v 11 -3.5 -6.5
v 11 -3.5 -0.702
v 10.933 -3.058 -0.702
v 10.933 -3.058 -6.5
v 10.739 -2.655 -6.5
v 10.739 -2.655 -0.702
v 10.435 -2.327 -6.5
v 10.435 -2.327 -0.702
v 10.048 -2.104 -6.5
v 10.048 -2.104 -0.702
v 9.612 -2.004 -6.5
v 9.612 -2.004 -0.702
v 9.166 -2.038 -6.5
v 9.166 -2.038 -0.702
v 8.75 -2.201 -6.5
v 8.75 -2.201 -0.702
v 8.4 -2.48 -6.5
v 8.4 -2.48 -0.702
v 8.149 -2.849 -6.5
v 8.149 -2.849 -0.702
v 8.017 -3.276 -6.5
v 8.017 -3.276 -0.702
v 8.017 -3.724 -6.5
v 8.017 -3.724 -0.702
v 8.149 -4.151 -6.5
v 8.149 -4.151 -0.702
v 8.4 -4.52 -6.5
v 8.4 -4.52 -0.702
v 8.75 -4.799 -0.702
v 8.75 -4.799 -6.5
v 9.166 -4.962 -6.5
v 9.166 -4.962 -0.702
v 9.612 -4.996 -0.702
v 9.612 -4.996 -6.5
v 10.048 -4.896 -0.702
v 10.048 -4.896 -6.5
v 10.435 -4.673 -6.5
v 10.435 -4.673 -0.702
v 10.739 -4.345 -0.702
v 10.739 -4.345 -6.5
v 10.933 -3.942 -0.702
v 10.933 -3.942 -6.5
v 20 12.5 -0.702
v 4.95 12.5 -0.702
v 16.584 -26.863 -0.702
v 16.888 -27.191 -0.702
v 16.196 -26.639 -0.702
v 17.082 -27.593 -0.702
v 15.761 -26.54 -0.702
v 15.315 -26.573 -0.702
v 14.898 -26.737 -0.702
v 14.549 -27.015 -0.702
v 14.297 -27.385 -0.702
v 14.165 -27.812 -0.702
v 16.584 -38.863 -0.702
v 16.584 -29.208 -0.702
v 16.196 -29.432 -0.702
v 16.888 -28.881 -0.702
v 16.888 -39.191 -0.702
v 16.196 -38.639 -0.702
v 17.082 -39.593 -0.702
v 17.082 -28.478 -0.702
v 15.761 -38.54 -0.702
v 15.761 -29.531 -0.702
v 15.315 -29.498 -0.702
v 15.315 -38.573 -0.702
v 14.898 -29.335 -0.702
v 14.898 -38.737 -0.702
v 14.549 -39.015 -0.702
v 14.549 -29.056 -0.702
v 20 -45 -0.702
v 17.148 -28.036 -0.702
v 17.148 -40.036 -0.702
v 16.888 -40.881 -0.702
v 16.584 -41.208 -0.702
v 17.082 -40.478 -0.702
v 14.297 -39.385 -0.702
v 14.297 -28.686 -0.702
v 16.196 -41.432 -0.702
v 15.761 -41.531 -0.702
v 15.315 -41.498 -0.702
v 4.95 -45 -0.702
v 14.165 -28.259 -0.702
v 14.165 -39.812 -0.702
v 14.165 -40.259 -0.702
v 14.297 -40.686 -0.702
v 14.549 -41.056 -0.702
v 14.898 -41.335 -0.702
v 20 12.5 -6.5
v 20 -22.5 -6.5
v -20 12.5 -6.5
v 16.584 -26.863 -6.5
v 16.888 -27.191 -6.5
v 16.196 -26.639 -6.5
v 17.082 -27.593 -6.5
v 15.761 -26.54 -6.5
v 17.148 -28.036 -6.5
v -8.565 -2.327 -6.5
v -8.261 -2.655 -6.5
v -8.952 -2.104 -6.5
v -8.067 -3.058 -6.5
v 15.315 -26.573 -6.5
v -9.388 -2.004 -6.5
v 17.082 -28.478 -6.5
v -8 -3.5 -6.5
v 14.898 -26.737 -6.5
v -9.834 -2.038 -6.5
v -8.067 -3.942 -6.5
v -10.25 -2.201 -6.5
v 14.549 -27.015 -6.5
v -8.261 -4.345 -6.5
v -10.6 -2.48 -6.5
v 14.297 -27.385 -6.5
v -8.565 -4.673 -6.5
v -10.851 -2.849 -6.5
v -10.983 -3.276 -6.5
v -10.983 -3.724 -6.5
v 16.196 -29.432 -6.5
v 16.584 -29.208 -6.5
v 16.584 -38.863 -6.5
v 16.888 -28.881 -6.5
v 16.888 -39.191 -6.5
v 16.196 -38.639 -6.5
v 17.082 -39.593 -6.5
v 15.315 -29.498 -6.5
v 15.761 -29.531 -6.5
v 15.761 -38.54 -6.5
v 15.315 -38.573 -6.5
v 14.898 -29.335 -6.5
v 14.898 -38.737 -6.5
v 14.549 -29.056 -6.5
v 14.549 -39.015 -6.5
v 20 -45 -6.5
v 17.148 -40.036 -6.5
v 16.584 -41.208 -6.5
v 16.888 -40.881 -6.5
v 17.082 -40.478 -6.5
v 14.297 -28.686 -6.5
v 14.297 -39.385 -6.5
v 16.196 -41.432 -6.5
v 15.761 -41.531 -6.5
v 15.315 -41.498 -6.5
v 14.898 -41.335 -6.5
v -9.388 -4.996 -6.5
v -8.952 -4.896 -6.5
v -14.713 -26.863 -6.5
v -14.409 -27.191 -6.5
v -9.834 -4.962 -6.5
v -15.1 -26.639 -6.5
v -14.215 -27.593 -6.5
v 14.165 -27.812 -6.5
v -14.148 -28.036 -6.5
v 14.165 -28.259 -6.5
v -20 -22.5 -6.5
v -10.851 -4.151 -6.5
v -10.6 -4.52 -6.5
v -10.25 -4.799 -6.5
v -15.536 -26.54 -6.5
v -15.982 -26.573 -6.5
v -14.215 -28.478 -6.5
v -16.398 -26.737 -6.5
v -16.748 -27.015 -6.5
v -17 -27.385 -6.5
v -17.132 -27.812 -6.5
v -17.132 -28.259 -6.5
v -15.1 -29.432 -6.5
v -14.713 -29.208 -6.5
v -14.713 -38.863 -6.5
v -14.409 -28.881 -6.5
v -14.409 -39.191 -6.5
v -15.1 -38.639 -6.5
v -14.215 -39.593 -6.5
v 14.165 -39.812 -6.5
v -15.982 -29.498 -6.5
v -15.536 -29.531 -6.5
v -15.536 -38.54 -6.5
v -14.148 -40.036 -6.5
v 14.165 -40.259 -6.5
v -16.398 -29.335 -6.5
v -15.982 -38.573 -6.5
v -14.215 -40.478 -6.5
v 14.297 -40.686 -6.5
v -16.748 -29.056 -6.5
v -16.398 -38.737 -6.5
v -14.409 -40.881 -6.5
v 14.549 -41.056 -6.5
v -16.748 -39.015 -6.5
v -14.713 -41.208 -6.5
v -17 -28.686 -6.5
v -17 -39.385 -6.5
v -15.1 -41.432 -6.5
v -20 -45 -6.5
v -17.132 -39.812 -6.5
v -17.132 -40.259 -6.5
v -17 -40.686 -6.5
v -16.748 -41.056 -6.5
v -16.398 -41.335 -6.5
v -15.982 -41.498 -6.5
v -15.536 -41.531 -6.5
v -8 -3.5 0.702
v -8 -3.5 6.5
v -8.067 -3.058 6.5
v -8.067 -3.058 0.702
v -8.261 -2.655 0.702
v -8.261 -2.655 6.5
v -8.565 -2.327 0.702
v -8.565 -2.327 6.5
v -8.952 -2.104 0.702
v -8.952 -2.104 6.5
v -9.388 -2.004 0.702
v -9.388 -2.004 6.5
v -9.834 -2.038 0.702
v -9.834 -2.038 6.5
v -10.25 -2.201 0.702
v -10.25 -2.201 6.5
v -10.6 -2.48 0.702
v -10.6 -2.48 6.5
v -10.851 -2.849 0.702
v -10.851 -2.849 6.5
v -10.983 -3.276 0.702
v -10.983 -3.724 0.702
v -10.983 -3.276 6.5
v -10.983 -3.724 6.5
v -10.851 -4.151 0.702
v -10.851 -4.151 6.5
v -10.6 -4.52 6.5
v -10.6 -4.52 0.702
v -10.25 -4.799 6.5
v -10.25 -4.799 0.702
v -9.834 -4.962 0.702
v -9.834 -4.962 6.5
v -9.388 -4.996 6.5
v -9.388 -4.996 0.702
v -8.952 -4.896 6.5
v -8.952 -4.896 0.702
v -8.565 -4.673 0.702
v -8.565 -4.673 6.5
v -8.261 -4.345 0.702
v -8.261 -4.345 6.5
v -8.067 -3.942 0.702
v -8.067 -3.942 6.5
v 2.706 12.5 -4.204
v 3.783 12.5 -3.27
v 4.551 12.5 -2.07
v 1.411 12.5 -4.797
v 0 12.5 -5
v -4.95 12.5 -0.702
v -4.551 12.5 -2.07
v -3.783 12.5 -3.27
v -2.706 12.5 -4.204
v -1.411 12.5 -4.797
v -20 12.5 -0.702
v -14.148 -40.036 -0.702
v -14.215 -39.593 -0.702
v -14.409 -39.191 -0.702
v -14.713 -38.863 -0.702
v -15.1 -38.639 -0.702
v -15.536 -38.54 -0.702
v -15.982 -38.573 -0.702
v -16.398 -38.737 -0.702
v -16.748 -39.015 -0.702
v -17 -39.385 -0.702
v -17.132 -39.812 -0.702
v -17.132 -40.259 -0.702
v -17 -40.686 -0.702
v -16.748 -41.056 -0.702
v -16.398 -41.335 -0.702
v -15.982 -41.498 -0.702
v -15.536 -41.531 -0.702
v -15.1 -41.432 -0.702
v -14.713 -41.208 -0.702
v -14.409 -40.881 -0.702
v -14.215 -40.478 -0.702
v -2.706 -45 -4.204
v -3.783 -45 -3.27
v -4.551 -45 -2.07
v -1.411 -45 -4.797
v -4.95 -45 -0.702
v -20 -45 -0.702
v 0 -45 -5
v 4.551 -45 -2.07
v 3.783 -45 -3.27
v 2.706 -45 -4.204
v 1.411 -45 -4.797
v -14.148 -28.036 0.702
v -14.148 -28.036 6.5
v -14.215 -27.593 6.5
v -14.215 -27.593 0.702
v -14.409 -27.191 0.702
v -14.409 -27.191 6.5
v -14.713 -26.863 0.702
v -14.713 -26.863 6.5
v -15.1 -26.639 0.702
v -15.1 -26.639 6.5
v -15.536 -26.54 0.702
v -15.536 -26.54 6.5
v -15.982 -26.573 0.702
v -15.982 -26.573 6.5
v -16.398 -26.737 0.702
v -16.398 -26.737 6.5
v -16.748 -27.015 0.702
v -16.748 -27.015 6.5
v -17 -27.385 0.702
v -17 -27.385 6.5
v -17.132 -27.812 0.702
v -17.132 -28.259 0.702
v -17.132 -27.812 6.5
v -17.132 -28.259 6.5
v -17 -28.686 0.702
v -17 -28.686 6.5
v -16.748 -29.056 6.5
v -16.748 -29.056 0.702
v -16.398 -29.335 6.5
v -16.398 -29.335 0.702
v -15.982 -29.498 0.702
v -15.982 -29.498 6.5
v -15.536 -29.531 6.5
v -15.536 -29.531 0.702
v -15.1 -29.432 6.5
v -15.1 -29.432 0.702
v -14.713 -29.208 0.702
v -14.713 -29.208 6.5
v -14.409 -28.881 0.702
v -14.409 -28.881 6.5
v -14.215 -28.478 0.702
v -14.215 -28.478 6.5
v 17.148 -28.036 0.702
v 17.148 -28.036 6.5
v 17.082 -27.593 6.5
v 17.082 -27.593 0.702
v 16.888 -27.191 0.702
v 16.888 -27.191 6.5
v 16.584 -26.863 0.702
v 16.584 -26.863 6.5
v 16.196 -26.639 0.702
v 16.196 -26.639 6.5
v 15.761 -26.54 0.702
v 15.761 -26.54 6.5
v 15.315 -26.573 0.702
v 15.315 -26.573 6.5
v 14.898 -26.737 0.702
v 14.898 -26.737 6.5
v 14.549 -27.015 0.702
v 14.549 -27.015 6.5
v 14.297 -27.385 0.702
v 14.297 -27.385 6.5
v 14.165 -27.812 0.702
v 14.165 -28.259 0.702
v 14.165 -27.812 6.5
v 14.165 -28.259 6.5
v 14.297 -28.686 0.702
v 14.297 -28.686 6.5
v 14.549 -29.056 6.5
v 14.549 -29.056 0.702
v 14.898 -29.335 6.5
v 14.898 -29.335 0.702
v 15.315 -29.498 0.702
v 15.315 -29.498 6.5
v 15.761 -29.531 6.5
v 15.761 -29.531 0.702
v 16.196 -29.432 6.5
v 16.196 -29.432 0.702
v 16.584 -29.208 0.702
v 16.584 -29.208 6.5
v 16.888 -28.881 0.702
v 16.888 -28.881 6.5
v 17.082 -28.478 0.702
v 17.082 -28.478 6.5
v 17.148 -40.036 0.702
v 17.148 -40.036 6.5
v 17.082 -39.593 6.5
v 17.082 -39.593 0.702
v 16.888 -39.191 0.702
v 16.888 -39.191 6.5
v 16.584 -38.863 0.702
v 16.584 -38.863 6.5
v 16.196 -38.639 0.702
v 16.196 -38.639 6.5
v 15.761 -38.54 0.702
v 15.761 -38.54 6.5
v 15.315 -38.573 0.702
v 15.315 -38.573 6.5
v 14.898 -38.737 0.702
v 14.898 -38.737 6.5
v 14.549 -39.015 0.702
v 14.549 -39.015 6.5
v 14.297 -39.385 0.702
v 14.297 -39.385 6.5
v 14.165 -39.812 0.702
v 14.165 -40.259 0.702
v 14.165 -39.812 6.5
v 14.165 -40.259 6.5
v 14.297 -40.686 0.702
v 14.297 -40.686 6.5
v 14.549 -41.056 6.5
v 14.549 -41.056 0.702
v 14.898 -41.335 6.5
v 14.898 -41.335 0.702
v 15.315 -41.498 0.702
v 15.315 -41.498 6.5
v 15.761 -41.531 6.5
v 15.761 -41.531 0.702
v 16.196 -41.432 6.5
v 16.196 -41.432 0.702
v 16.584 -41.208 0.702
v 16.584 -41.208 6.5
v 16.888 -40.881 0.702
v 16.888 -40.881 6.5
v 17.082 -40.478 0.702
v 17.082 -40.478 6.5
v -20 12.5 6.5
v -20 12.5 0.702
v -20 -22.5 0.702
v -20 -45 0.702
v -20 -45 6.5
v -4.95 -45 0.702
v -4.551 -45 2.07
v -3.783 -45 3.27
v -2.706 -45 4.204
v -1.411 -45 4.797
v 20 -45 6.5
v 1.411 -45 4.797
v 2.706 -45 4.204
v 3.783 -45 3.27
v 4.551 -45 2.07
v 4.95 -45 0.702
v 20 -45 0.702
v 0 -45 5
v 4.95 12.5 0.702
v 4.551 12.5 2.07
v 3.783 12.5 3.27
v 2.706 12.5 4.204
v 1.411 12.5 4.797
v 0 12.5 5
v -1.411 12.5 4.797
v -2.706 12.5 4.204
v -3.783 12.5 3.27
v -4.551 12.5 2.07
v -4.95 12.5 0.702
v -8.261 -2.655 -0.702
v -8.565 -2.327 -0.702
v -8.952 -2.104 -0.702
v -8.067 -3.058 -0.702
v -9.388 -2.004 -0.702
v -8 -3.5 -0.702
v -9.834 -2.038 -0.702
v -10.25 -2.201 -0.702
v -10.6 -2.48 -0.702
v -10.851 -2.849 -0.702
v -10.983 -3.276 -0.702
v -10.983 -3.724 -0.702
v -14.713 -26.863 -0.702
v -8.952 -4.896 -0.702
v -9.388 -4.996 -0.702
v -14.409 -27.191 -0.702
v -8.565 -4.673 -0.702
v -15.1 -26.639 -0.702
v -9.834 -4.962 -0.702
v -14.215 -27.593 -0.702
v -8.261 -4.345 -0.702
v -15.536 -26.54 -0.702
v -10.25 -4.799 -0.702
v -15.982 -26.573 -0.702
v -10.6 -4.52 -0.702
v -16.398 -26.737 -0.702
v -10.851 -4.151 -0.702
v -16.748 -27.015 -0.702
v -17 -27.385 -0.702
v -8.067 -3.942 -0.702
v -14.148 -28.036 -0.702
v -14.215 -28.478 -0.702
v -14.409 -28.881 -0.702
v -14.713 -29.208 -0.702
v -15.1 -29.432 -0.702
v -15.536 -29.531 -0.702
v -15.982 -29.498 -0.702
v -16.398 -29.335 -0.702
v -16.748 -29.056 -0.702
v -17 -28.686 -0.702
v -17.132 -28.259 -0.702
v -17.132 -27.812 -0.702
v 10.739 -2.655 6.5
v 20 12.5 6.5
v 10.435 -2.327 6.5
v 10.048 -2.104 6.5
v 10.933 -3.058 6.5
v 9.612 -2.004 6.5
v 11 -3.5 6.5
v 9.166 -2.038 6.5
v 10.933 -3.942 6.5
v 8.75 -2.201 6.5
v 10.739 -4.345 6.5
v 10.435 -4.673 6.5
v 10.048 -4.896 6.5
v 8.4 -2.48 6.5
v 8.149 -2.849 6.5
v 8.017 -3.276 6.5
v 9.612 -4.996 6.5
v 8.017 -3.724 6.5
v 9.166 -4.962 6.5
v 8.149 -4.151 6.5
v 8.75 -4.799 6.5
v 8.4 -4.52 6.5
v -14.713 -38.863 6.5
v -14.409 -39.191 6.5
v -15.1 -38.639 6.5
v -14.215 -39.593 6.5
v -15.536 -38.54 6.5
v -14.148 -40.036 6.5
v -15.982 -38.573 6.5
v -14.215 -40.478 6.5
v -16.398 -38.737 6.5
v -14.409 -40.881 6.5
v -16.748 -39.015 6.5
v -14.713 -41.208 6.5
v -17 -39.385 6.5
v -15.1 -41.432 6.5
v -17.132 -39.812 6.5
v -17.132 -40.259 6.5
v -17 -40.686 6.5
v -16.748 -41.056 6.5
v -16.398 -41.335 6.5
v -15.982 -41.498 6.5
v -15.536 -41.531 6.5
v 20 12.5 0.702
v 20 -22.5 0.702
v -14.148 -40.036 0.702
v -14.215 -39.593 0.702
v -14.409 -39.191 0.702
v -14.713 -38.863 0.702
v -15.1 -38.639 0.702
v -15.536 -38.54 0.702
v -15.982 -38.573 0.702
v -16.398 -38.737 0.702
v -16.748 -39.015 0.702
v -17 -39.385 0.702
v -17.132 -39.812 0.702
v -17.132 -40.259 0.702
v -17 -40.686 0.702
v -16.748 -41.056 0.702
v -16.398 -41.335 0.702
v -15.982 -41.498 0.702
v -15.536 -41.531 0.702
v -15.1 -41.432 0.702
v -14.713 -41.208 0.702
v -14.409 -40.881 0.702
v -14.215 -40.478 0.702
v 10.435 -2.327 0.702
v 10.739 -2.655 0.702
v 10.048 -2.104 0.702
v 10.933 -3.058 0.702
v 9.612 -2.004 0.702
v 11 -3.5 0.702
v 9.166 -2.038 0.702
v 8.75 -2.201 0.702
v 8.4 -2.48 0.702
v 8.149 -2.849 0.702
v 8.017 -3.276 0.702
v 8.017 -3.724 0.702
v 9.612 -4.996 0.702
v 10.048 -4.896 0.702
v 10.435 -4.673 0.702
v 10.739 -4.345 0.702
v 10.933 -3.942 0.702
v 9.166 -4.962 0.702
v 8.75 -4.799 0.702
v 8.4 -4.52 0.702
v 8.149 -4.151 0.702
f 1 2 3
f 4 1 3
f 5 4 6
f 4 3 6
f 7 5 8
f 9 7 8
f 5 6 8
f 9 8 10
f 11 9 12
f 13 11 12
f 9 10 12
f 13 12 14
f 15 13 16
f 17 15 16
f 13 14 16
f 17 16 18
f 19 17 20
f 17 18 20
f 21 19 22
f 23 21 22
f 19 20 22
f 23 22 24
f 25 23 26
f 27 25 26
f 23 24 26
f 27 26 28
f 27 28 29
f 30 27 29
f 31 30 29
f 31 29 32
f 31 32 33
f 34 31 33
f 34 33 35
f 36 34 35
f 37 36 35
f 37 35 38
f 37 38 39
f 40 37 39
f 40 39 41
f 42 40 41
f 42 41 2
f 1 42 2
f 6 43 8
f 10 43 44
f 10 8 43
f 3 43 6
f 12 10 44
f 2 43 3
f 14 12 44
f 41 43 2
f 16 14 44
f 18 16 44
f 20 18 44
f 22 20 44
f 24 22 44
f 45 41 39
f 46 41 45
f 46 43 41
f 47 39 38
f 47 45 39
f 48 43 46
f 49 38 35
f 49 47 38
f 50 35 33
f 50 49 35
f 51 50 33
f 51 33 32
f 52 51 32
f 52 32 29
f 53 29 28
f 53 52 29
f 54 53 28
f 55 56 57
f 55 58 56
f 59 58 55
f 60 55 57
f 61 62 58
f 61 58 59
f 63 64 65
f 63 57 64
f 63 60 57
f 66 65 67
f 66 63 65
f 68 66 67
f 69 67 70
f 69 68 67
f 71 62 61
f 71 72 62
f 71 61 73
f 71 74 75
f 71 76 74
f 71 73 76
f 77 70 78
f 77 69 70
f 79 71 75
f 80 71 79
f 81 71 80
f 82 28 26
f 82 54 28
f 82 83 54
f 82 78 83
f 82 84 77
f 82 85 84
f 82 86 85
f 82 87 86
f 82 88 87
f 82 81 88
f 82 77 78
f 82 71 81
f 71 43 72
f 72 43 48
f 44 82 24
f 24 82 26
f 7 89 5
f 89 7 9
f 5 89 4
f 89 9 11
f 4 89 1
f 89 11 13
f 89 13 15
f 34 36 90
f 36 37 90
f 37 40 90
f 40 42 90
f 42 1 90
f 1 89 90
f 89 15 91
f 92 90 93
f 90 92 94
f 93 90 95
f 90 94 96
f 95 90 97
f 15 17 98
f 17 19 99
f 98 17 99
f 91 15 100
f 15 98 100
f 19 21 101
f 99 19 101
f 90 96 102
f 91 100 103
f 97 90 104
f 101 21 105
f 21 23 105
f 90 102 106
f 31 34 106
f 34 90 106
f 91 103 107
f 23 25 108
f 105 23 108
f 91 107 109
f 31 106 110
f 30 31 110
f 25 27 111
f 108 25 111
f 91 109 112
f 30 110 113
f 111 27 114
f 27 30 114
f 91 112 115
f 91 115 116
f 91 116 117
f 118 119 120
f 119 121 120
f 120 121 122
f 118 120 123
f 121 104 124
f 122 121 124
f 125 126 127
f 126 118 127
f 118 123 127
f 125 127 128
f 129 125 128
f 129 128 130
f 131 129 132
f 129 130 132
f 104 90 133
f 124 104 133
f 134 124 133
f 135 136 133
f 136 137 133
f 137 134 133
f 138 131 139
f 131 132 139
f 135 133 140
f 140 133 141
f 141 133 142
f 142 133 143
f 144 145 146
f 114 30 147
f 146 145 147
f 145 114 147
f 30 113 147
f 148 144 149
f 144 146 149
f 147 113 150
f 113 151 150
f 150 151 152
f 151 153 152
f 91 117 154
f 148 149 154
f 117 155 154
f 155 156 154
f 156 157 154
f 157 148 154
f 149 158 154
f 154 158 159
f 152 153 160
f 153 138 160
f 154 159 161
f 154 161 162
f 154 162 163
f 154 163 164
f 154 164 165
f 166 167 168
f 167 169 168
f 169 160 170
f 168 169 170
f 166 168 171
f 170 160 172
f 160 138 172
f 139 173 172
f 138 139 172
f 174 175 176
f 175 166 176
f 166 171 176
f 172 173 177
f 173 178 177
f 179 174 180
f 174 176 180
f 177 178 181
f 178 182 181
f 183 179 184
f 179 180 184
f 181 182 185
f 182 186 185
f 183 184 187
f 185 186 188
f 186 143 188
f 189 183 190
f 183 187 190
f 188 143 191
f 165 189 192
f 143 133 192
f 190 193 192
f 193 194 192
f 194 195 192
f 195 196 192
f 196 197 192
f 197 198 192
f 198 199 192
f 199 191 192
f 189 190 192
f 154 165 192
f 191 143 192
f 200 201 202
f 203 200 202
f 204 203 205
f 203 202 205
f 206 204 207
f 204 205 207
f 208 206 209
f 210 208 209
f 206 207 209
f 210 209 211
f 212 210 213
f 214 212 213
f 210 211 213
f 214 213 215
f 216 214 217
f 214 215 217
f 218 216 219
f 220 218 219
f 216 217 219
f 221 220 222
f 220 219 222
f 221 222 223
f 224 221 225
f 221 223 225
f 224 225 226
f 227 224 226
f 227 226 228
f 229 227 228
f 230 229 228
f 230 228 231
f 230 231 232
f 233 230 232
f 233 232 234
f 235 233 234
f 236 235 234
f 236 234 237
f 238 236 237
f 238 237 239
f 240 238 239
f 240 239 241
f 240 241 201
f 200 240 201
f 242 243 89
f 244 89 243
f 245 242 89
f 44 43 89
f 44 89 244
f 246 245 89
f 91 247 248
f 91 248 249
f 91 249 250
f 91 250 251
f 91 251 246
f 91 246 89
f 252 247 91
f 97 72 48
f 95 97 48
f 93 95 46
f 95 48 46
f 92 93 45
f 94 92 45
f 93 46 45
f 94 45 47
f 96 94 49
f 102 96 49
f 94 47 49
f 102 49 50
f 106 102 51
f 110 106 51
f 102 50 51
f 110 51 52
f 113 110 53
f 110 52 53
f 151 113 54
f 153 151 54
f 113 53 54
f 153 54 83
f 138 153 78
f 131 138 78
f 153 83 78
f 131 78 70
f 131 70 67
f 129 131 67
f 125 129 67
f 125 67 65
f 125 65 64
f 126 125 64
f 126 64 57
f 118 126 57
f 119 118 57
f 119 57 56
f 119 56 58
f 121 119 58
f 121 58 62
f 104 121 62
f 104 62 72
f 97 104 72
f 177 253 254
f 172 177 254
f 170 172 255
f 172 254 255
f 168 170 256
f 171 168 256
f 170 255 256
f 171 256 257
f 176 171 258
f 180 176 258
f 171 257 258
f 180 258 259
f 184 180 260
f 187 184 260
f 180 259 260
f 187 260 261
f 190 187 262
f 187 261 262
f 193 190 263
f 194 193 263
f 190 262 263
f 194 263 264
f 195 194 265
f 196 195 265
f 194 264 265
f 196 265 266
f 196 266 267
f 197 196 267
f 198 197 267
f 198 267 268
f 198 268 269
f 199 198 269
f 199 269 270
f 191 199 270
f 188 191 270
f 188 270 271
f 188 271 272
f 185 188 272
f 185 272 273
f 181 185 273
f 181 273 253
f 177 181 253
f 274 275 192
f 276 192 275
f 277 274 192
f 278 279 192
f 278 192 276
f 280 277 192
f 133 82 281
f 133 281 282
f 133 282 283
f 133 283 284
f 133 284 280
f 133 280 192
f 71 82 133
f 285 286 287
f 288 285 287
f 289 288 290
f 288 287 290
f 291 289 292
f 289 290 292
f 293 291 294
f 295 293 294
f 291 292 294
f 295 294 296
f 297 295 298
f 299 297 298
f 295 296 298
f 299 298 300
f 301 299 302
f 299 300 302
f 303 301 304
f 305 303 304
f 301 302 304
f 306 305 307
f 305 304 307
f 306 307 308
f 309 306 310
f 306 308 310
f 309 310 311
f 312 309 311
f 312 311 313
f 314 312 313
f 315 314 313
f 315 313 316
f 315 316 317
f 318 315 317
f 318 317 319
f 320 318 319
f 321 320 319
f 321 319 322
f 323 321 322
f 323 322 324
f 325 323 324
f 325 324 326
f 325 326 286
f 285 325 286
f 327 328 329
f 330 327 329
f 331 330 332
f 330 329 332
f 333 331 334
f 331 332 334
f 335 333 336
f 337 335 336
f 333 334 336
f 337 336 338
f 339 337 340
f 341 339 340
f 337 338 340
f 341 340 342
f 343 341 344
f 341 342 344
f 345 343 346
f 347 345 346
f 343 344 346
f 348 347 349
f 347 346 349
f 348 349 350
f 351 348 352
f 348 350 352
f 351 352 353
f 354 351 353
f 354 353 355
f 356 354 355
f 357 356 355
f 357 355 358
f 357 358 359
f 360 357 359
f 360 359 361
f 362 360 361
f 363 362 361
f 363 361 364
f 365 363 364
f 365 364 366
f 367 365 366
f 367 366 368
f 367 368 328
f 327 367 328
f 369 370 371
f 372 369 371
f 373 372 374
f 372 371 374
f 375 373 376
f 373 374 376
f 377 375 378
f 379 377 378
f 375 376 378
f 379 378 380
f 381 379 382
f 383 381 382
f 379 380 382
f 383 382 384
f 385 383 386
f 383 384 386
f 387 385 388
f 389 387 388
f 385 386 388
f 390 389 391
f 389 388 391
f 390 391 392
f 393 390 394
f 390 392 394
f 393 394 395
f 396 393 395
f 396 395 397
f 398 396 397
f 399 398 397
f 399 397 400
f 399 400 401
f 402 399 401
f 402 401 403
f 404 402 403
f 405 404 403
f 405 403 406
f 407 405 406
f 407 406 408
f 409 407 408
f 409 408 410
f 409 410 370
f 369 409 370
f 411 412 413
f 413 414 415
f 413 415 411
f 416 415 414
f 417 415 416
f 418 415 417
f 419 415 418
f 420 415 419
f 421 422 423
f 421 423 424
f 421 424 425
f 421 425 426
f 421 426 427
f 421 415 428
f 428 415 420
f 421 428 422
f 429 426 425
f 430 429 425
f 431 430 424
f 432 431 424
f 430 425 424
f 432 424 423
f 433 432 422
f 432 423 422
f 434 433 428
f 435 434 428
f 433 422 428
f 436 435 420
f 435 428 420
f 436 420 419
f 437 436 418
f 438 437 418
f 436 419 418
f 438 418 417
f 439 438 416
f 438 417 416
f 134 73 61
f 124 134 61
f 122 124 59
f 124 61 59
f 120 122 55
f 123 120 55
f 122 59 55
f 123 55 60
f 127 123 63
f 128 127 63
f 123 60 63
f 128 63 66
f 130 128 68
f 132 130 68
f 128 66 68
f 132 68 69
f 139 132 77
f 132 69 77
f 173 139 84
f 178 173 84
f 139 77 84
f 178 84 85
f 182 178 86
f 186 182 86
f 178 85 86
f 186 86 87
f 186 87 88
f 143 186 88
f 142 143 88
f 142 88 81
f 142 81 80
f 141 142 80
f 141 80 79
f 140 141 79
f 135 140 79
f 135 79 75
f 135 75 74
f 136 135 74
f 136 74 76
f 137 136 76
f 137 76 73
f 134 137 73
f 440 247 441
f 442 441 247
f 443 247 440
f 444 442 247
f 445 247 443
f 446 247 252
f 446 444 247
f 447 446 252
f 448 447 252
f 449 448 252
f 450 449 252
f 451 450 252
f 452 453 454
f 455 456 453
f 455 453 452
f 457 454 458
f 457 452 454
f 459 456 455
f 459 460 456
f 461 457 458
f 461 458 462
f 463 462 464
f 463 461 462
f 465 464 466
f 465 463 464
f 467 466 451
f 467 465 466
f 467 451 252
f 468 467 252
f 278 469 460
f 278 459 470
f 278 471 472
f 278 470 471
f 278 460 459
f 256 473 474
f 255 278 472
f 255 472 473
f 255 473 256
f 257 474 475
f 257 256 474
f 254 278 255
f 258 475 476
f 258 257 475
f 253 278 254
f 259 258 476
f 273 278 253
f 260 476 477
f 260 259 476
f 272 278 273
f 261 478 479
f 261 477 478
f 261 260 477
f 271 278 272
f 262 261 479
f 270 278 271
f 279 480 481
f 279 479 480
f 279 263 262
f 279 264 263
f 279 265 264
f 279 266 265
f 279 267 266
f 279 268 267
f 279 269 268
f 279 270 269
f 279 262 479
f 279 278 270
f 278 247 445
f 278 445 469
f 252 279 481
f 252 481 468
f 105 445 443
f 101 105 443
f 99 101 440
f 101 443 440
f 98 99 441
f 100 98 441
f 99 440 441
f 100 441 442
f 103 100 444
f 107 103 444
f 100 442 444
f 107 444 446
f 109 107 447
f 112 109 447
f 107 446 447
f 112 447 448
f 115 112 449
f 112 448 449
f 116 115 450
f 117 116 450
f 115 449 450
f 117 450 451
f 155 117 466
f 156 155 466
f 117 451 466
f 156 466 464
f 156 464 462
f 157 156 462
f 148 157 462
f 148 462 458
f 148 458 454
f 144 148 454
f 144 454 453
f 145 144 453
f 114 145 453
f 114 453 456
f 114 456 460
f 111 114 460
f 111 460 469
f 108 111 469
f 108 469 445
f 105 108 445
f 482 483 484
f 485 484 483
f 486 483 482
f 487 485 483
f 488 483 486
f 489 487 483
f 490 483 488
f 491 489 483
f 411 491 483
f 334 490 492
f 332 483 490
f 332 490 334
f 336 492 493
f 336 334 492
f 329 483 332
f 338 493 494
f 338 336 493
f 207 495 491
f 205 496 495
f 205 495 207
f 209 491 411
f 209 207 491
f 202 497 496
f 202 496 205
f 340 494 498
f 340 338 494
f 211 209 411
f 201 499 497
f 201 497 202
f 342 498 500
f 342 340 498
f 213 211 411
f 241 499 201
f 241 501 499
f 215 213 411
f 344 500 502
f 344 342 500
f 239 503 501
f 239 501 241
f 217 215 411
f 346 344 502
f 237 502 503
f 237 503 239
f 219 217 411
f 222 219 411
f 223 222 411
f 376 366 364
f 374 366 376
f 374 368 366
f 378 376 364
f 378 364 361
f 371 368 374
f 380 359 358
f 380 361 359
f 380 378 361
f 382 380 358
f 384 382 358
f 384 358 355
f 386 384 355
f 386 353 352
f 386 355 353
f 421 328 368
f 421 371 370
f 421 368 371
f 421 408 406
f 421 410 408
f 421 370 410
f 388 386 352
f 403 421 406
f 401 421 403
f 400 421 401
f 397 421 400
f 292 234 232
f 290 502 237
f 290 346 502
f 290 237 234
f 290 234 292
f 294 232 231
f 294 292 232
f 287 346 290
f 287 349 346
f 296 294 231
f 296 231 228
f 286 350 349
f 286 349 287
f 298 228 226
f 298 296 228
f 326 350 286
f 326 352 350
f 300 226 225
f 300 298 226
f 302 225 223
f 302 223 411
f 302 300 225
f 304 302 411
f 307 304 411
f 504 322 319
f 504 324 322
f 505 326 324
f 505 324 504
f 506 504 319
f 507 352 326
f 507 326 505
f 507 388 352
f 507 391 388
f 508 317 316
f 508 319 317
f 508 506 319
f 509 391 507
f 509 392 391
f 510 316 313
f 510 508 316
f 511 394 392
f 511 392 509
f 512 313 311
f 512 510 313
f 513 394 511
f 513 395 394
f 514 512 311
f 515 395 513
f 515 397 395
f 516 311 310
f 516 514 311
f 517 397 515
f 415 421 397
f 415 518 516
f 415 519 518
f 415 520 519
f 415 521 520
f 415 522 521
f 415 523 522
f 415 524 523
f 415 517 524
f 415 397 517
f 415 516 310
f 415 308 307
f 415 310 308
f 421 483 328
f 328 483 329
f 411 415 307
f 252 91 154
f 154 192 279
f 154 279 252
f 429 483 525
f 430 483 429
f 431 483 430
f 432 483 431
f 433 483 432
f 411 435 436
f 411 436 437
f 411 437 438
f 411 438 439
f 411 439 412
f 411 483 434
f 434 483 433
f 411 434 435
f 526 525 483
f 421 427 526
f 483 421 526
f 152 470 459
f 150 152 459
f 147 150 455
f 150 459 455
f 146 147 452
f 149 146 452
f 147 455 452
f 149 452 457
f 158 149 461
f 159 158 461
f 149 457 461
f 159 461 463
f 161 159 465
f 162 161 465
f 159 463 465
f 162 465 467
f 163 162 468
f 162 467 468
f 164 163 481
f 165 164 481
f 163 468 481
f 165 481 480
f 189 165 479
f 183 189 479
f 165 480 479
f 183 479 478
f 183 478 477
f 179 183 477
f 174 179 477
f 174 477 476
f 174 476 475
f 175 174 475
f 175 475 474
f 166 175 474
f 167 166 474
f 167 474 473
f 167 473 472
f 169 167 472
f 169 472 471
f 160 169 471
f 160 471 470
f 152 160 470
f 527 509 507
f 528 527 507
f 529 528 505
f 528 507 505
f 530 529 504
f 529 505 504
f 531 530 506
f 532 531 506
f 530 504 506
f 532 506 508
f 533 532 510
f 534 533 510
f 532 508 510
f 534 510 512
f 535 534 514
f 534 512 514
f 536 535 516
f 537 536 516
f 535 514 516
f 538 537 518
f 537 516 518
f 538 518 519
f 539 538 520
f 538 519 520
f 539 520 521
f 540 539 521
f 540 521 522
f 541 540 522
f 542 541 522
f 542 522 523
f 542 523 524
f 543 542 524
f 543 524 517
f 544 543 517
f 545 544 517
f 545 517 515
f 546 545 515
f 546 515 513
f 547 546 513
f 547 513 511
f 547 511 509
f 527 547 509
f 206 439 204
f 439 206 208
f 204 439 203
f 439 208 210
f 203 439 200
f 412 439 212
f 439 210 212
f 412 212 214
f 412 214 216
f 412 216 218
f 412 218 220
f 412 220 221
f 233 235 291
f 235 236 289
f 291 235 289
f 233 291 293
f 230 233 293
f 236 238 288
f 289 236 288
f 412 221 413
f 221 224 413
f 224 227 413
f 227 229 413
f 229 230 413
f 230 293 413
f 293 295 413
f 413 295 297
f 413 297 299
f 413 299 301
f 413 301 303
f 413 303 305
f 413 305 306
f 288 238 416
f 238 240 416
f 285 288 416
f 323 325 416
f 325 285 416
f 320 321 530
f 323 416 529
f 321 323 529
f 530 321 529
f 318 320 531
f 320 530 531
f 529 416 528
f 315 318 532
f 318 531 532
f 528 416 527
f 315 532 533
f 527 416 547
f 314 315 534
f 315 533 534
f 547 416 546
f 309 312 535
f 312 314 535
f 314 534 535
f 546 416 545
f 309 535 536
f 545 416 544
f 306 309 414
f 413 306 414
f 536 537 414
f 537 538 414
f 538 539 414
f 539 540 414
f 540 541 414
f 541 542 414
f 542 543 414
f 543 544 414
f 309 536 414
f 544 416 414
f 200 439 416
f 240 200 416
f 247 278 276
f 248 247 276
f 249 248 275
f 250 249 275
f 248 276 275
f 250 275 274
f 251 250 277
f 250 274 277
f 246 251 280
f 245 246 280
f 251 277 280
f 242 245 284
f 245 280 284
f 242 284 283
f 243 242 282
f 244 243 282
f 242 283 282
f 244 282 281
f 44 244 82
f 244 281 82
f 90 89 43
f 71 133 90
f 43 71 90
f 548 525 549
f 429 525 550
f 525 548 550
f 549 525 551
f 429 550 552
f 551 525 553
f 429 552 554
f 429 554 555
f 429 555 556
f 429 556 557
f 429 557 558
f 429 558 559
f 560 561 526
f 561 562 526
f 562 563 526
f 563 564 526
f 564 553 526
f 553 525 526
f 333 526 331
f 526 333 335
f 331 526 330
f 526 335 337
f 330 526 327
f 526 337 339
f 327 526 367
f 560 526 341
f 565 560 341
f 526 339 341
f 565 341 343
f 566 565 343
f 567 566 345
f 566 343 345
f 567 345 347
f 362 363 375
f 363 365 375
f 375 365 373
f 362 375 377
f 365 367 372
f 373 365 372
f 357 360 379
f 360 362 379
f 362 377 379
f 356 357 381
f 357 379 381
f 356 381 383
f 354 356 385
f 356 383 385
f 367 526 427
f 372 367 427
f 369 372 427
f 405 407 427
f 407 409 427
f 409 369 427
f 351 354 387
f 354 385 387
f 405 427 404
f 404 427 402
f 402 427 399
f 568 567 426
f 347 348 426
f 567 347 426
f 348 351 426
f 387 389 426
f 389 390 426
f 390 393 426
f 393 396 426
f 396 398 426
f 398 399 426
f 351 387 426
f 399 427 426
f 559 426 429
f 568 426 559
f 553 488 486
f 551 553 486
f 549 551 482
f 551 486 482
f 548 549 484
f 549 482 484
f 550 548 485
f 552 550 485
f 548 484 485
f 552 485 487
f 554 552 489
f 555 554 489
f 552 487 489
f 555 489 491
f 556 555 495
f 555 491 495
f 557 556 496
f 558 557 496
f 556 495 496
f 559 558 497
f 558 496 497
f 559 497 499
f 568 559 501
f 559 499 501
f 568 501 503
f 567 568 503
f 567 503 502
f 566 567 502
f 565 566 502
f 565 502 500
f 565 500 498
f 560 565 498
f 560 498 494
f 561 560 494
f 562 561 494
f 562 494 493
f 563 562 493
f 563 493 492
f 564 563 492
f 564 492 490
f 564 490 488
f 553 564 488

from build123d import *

# Parameters (mm, degrees)
F1_DEPTH  = 45
F2_W      = 40
F2_H      = 22.5
F3_DEPTH  = 25
F4_W      = 40
F4_H      = 5.7979146773
F6_DEPTH  = 25
F5_W      = 40
F5_H      = 5.7979146773
F8_DEPTH  = 10
F9_R      = 1.5
F10_DEPTH = 25
F11_DEPTH = 56.4


with BuildPart() as f1:
    # F0 (on Front) → F1 (new body)
    with BuildSketch(Plane.XZ):
        with BuildLine():
            Line((-20, 6.5), (-20, 0.7020853227))
            Line((-20, 0.7020853227), (-4.9504622208, 0.7020853227))
            ThreePointArc((-4.9504622208, 0.7020853227), (0, 5), (4.9504622208, 0.7020853227))
            Line((4.9504622208, 0.7020853227), (20, 0.7020853227))
            Line((20, 0.7020853227), (20, 6.5))
            Line((20, 6.5), (-20, 6.5))
        make_face()
    extrude(amount=F1_DEPTH)


with BuildPart() as f1b:
    # F0 (on Front) → F1, piece 2 (new body)
    with BuildSketch(Plane.XZ):
        with BuildLine():
            ThreePointArc((4.9504622208, -0.7020853227), (0, -5), (-4.9504622208, -0.7020853227))
            Line((-4.9504622208, -0.7020853227), (-20, -0.7020853227))
            Line((-20, -0.7020853227), (-20, -6.5))
            Line((-20, -6.5), (20, -6.5))
            Line((20, -6.5), (20, -0.7020853227))
            Line((20, -0.7020853227), (4.9504622208, -0.7020853227))
        make_face()
    extrude(amount=F1_DEPTH)


with BuildPart() as f3_tool:
    # F2 (on face) → F3 (new body)
    with BuildSketch(Plane.XY.offset(6.5)):
        with Locations((0, -11.25)):
            Rectangle(F2_W, F2_H)
    extrude(amount=-F3_DEPTH)


with BuildPart() as f1_1:
    add(f1.part)

    # F3: cut by f3_tool
    add(f3_tool.part, mode=Mode.SUBTRACT)

    # F4 (on face) → F6 (join)
    with BuildSketch(Plane(origin=(0, -22.5, 0), x_dir=(-1, 0, 0), z_dir=(0, 1, 0))):
        with Locations((0, 3.6010426614)):
            Rectangle(F4_W, F4_H)
    extrude(amount=F6_DEPTH)

    # F7: union 

    # F8 (add): a face of the model
    f8_faces = [f1_1.faces().sort_by_distance(p)[0] for p in [
        (0, 2.5, 3.6010426614),
    ]]
    extrude(f8_faces, amount=F8_DEPTH)


with BuildPart() as f1b_1:
    add(f1b.part)

    # F3: cut by f3_tool
    add(f3_tool.part, mode=Mode.SUBTRACT)

    # F5 (on face) → F6, piece 2 (join)
    with BuildSketch(Plane(origin=(0, -22.5, 0), x_dir=(-1, 0, 0), z_dir=(0, 1, 0))):
        with Locations((0, -3.6010426614)):
            Rectangle(F5_W, F5_H)
    extrude(amount=F6_DEPTH)

    # F8#2 (add): a face of the model
    f8_2_faces = [f1b_1.faces().sort_by_distance(p)[0] for p in [
        (0, 2.5, -3.6010426614),
    ]]
    extrude(f8_2_faces, amount=F8_DEPTH)


with BuildPart() as f10_tool:
    # F9 (on face) → F10 (new body)
    with BuildSketch(Plane.XY.offset(6.5)):
        with Locations((-15.648426488, -40.0356091559)):
            Circle(F9_R)
        with Locations((-15.648426488, -28.0356091559)):
            Circle(F9_R)
        with Locations((15.648426488, -40.0356091559)):
            Circle(F9_R)
        with Locations((15.648426488, -28.0356091559)):
            Circle(F9_R)
        with Locations((9.5, -3.5)):
            Circle(F9_R)
        with Locations((-9.5, -3.5)):
            Circle(F9_R)
    extrude(amount=-F10_DEPTH)


with BuildPart() as f1_2:
    add(f1_1.part)

    # F10: cut by f10_tool
    add(f10_tool.part, mode=Mode.SUBTRACT)


with BuildPart() as f1b_2:
    add(f1b_1.part)

    # F10: cut by f10_tool
    add(f10_tool.part, mode=Mode.SUBTRACT)


with BuildPart() as f11_tool:
    # F6_face1 (on face) → F11 (new body)
    with BuildSketch(Plane(origin=(0, -22.5, 2.5062101444), x_dir=(-1, 0, 0), z_dir=(0, -1, 0))):
        with BuildLine():
            Line((4.9504622208, 1.8041248217), (-4.9504622208, 1.8041248217))
            ThreePointArc((-4.9504622208, 1.8041248217), (0, -2.4937898556), (4.9504622208, 1.8041248217))
        make_face()
        with BuildLine():
            ThreePointArc((4.9504622208, 3.2082954671), (0, 7.5062101444), (-4.9504622208, 3.2082954671))
            Line((-4.9504622208, 3.2082954671), (4.9504622208, 3.2082954671))
        make_face()
    extrude(amount=-F11_DEPTH)


with BuildPart() as f1_3:
    add(f1_2.part)

    # F11: cut by f11_tool
    add(f11_tool.part, mode=Mode.SUBTRACT)


with BuildPart() as f1b_3:
    add(f1b_2.part)

    # F11: cut by f11_tool
    add(f11_tool.part, mode=Mode.SUBTRACT)


solid = Compound([f1_3.part, f1b_3.part])
